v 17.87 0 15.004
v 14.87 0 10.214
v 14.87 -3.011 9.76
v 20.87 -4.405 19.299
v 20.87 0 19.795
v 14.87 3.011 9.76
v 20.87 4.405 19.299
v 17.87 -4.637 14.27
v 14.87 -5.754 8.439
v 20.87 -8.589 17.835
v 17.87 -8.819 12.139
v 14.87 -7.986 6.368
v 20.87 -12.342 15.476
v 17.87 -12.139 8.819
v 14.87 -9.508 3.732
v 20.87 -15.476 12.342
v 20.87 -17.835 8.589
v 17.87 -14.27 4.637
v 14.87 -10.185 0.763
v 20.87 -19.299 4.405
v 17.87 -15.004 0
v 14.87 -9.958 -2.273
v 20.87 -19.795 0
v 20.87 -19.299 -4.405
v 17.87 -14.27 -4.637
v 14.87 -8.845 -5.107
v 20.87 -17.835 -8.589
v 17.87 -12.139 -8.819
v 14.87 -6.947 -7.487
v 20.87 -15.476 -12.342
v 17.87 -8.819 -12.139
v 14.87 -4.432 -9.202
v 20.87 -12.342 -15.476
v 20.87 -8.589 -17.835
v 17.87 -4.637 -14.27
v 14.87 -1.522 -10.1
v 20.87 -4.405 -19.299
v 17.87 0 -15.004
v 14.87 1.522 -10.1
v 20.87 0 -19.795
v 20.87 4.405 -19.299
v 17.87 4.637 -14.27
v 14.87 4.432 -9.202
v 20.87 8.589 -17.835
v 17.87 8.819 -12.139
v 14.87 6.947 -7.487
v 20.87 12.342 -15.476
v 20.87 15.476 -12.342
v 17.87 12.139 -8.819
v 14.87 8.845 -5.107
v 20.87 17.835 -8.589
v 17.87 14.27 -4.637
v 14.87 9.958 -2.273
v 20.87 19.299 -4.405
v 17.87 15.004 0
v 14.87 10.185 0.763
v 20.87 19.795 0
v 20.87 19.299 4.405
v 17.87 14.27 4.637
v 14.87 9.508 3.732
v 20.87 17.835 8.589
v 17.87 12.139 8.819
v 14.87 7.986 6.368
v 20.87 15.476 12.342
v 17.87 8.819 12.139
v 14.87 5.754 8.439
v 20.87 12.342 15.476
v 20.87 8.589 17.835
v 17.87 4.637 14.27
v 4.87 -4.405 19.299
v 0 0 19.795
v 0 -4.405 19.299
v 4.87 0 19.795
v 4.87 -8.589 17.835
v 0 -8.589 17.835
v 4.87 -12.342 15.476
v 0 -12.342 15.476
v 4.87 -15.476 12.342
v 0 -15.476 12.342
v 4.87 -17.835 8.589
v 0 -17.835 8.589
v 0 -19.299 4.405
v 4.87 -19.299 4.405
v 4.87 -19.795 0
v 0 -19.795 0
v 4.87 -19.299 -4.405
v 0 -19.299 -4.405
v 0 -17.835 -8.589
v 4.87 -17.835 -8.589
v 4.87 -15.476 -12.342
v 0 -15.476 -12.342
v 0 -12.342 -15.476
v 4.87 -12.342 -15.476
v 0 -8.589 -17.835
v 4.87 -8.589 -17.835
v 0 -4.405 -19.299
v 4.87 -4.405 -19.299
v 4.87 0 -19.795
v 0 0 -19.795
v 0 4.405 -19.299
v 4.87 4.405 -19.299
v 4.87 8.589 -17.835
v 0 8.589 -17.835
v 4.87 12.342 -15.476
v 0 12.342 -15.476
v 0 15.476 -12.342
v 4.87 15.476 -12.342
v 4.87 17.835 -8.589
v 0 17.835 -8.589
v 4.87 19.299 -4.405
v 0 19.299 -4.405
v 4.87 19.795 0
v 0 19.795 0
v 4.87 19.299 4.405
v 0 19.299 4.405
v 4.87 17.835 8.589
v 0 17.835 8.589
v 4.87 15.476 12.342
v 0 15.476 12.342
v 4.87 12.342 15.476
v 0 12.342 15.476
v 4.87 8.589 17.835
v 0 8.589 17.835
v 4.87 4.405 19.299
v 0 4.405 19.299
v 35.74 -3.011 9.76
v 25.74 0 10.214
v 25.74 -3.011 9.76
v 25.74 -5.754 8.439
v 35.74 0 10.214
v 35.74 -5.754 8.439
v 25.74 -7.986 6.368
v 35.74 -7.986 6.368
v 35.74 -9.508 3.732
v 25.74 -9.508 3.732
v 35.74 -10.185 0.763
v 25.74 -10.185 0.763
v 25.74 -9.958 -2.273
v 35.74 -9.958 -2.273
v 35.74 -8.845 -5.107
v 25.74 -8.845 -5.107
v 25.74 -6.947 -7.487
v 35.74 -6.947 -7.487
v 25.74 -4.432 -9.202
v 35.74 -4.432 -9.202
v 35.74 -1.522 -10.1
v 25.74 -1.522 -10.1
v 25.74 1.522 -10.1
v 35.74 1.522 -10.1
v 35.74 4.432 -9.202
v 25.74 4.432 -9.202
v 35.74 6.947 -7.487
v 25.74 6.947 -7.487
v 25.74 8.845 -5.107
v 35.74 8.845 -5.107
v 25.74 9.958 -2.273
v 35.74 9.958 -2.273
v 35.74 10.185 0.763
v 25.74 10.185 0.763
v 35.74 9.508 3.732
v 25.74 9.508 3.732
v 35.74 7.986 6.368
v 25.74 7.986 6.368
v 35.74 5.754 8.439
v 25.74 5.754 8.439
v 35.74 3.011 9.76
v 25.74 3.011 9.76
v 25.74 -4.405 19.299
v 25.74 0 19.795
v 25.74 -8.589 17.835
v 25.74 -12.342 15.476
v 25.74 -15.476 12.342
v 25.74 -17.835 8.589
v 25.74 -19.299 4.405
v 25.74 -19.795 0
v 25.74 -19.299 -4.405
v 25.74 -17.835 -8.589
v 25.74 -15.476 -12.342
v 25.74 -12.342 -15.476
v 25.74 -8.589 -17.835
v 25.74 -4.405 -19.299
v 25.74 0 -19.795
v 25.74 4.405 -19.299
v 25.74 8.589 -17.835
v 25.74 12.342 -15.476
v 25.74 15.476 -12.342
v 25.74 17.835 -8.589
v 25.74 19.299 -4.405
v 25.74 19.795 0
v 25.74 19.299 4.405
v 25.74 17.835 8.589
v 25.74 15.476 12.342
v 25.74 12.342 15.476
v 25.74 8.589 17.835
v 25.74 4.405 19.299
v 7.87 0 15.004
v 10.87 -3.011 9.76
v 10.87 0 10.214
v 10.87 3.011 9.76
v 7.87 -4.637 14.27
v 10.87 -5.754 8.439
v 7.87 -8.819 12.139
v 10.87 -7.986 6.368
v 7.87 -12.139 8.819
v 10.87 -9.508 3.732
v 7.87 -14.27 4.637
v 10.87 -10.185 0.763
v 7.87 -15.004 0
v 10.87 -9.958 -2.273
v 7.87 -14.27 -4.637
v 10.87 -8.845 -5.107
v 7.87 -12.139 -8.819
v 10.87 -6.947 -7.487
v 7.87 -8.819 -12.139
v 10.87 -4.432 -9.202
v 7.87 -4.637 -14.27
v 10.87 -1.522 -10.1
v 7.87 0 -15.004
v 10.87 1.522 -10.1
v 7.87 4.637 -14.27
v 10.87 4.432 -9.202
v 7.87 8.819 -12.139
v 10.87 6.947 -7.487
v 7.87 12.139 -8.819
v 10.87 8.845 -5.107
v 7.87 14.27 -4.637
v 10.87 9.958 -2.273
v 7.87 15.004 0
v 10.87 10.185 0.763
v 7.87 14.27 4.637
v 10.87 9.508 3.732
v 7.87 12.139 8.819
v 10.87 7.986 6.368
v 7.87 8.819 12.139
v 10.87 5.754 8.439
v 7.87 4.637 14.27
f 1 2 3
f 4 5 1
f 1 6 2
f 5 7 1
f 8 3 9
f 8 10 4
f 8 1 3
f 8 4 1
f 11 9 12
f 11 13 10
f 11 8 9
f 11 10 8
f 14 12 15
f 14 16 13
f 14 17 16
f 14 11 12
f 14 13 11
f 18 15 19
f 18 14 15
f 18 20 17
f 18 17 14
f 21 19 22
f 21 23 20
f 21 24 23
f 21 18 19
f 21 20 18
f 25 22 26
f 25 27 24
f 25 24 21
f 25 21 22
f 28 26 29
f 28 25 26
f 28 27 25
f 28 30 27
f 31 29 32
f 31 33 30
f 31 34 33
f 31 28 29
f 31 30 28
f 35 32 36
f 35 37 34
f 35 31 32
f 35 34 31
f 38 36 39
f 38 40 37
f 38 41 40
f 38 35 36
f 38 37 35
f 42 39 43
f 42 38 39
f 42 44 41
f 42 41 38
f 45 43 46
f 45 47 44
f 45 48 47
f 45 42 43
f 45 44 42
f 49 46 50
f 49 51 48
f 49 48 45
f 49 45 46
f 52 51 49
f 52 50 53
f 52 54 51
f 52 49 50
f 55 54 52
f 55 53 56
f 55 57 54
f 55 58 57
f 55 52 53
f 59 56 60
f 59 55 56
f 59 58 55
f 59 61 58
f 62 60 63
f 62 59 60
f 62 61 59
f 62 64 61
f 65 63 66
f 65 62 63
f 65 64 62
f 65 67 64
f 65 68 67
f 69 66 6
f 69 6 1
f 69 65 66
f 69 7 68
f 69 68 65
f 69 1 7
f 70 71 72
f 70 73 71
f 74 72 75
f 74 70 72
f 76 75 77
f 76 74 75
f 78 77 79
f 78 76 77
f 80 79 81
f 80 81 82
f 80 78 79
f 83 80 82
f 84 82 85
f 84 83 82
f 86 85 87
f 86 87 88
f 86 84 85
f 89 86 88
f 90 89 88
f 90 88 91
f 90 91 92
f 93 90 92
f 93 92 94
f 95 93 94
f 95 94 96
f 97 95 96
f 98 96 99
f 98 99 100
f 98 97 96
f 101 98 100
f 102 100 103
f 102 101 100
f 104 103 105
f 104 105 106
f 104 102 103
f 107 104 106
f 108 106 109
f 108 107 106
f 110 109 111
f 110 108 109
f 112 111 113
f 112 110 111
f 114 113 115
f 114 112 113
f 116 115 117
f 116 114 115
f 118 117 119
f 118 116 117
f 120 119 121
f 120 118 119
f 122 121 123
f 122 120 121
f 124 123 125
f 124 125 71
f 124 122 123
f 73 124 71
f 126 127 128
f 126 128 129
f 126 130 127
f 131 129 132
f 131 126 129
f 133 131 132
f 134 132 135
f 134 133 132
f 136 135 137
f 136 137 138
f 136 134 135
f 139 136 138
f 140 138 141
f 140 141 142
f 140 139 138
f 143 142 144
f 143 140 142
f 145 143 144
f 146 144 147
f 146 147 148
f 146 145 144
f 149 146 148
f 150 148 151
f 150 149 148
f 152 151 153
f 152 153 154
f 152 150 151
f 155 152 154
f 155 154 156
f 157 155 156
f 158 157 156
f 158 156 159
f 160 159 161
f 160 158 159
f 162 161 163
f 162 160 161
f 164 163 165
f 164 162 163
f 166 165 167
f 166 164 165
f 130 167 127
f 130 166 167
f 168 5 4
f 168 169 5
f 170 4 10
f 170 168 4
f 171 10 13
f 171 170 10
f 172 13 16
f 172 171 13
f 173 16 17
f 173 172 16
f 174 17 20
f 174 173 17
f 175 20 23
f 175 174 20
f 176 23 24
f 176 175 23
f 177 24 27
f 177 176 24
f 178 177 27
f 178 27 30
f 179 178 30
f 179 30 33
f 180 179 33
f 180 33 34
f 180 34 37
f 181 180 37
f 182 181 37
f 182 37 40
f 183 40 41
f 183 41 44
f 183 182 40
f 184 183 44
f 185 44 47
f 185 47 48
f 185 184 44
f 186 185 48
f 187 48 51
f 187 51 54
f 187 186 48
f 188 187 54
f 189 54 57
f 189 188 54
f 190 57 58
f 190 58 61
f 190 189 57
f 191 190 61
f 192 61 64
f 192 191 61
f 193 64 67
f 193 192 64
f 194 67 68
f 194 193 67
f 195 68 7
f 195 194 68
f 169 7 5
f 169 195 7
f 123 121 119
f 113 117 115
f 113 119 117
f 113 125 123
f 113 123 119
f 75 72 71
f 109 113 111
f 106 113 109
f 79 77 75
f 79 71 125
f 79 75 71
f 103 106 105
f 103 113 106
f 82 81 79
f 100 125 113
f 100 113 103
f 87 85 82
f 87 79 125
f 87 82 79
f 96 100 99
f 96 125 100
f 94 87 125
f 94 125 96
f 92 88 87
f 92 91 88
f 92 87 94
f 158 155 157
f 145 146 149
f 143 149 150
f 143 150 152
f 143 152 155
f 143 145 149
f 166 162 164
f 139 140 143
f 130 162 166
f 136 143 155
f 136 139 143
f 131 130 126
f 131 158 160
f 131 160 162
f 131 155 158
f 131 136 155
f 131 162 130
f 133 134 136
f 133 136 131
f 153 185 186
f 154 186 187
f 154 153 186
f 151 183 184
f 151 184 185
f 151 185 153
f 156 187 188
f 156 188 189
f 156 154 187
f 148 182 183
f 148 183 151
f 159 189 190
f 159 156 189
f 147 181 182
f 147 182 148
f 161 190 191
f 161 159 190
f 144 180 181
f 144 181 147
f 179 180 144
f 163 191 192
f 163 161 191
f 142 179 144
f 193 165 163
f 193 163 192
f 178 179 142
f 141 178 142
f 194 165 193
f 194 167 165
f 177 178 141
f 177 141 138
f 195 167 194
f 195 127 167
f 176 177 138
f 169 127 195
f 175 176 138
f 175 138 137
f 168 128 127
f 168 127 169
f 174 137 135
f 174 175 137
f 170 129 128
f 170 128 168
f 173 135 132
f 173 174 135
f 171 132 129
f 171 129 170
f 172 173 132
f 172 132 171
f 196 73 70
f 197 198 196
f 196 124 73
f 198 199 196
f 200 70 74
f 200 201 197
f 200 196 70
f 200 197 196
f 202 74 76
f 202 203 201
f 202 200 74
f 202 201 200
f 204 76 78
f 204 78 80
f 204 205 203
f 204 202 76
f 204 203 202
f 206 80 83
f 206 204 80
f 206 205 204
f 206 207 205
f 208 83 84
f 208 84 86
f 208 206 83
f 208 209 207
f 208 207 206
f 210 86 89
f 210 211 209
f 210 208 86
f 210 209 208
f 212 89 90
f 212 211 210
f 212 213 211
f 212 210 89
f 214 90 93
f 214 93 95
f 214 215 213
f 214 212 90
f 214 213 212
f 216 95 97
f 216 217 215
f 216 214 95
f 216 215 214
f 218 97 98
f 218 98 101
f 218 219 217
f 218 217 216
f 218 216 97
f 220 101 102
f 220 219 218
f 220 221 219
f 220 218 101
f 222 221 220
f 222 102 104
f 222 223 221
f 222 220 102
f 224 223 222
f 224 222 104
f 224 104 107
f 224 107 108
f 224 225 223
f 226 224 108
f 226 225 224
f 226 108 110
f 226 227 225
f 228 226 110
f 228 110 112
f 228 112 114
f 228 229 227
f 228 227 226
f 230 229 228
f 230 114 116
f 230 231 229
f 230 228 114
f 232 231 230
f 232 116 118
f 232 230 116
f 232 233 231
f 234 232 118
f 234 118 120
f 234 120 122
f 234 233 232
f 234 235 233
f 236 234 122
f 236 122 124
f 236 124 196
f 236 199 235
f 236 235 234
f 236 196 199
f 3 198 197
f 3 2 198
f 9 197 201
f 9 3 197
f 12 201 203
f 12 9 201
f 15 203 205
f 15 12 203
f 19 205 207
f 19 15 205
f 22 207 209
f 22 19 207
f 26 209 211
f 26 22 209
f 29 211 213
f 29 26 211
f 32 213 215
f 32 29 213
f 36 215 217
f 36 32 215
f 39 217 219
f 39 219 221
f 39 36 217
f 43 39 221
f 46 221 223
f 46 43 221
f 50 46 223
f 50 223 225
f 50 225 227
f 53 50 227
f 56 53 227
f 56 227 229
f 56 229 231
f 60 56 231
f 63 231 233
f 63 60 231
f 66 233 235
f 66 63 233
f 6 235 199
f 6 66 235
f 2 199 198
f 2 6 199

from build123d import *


with BuildPart() as part:
    # 草圖1 → 旋轉1 (revolve)
    with BuildSketch(Plane.XY, mode=Mode.PRIVATE) as revolve_1_sk:
        Polygon((0, 0), (0, 19.795), (4.87, 19.795), (10.87, 10.213858447), (14.87, 10.213858447), (20.87, 19.795), (25.74, 19.795), (25.74, 10.213858447), (35.74, 10.213858447), (35.74, 0), align=None)
    revolve(revolve_1_sk.sketch.rotate(Axis((-743.15639781, 0, 0), (1, 0, 0)), 90), axis=Axis((-743.15639781, 0, 0), (1, 0, 0)))


solid = part.part
